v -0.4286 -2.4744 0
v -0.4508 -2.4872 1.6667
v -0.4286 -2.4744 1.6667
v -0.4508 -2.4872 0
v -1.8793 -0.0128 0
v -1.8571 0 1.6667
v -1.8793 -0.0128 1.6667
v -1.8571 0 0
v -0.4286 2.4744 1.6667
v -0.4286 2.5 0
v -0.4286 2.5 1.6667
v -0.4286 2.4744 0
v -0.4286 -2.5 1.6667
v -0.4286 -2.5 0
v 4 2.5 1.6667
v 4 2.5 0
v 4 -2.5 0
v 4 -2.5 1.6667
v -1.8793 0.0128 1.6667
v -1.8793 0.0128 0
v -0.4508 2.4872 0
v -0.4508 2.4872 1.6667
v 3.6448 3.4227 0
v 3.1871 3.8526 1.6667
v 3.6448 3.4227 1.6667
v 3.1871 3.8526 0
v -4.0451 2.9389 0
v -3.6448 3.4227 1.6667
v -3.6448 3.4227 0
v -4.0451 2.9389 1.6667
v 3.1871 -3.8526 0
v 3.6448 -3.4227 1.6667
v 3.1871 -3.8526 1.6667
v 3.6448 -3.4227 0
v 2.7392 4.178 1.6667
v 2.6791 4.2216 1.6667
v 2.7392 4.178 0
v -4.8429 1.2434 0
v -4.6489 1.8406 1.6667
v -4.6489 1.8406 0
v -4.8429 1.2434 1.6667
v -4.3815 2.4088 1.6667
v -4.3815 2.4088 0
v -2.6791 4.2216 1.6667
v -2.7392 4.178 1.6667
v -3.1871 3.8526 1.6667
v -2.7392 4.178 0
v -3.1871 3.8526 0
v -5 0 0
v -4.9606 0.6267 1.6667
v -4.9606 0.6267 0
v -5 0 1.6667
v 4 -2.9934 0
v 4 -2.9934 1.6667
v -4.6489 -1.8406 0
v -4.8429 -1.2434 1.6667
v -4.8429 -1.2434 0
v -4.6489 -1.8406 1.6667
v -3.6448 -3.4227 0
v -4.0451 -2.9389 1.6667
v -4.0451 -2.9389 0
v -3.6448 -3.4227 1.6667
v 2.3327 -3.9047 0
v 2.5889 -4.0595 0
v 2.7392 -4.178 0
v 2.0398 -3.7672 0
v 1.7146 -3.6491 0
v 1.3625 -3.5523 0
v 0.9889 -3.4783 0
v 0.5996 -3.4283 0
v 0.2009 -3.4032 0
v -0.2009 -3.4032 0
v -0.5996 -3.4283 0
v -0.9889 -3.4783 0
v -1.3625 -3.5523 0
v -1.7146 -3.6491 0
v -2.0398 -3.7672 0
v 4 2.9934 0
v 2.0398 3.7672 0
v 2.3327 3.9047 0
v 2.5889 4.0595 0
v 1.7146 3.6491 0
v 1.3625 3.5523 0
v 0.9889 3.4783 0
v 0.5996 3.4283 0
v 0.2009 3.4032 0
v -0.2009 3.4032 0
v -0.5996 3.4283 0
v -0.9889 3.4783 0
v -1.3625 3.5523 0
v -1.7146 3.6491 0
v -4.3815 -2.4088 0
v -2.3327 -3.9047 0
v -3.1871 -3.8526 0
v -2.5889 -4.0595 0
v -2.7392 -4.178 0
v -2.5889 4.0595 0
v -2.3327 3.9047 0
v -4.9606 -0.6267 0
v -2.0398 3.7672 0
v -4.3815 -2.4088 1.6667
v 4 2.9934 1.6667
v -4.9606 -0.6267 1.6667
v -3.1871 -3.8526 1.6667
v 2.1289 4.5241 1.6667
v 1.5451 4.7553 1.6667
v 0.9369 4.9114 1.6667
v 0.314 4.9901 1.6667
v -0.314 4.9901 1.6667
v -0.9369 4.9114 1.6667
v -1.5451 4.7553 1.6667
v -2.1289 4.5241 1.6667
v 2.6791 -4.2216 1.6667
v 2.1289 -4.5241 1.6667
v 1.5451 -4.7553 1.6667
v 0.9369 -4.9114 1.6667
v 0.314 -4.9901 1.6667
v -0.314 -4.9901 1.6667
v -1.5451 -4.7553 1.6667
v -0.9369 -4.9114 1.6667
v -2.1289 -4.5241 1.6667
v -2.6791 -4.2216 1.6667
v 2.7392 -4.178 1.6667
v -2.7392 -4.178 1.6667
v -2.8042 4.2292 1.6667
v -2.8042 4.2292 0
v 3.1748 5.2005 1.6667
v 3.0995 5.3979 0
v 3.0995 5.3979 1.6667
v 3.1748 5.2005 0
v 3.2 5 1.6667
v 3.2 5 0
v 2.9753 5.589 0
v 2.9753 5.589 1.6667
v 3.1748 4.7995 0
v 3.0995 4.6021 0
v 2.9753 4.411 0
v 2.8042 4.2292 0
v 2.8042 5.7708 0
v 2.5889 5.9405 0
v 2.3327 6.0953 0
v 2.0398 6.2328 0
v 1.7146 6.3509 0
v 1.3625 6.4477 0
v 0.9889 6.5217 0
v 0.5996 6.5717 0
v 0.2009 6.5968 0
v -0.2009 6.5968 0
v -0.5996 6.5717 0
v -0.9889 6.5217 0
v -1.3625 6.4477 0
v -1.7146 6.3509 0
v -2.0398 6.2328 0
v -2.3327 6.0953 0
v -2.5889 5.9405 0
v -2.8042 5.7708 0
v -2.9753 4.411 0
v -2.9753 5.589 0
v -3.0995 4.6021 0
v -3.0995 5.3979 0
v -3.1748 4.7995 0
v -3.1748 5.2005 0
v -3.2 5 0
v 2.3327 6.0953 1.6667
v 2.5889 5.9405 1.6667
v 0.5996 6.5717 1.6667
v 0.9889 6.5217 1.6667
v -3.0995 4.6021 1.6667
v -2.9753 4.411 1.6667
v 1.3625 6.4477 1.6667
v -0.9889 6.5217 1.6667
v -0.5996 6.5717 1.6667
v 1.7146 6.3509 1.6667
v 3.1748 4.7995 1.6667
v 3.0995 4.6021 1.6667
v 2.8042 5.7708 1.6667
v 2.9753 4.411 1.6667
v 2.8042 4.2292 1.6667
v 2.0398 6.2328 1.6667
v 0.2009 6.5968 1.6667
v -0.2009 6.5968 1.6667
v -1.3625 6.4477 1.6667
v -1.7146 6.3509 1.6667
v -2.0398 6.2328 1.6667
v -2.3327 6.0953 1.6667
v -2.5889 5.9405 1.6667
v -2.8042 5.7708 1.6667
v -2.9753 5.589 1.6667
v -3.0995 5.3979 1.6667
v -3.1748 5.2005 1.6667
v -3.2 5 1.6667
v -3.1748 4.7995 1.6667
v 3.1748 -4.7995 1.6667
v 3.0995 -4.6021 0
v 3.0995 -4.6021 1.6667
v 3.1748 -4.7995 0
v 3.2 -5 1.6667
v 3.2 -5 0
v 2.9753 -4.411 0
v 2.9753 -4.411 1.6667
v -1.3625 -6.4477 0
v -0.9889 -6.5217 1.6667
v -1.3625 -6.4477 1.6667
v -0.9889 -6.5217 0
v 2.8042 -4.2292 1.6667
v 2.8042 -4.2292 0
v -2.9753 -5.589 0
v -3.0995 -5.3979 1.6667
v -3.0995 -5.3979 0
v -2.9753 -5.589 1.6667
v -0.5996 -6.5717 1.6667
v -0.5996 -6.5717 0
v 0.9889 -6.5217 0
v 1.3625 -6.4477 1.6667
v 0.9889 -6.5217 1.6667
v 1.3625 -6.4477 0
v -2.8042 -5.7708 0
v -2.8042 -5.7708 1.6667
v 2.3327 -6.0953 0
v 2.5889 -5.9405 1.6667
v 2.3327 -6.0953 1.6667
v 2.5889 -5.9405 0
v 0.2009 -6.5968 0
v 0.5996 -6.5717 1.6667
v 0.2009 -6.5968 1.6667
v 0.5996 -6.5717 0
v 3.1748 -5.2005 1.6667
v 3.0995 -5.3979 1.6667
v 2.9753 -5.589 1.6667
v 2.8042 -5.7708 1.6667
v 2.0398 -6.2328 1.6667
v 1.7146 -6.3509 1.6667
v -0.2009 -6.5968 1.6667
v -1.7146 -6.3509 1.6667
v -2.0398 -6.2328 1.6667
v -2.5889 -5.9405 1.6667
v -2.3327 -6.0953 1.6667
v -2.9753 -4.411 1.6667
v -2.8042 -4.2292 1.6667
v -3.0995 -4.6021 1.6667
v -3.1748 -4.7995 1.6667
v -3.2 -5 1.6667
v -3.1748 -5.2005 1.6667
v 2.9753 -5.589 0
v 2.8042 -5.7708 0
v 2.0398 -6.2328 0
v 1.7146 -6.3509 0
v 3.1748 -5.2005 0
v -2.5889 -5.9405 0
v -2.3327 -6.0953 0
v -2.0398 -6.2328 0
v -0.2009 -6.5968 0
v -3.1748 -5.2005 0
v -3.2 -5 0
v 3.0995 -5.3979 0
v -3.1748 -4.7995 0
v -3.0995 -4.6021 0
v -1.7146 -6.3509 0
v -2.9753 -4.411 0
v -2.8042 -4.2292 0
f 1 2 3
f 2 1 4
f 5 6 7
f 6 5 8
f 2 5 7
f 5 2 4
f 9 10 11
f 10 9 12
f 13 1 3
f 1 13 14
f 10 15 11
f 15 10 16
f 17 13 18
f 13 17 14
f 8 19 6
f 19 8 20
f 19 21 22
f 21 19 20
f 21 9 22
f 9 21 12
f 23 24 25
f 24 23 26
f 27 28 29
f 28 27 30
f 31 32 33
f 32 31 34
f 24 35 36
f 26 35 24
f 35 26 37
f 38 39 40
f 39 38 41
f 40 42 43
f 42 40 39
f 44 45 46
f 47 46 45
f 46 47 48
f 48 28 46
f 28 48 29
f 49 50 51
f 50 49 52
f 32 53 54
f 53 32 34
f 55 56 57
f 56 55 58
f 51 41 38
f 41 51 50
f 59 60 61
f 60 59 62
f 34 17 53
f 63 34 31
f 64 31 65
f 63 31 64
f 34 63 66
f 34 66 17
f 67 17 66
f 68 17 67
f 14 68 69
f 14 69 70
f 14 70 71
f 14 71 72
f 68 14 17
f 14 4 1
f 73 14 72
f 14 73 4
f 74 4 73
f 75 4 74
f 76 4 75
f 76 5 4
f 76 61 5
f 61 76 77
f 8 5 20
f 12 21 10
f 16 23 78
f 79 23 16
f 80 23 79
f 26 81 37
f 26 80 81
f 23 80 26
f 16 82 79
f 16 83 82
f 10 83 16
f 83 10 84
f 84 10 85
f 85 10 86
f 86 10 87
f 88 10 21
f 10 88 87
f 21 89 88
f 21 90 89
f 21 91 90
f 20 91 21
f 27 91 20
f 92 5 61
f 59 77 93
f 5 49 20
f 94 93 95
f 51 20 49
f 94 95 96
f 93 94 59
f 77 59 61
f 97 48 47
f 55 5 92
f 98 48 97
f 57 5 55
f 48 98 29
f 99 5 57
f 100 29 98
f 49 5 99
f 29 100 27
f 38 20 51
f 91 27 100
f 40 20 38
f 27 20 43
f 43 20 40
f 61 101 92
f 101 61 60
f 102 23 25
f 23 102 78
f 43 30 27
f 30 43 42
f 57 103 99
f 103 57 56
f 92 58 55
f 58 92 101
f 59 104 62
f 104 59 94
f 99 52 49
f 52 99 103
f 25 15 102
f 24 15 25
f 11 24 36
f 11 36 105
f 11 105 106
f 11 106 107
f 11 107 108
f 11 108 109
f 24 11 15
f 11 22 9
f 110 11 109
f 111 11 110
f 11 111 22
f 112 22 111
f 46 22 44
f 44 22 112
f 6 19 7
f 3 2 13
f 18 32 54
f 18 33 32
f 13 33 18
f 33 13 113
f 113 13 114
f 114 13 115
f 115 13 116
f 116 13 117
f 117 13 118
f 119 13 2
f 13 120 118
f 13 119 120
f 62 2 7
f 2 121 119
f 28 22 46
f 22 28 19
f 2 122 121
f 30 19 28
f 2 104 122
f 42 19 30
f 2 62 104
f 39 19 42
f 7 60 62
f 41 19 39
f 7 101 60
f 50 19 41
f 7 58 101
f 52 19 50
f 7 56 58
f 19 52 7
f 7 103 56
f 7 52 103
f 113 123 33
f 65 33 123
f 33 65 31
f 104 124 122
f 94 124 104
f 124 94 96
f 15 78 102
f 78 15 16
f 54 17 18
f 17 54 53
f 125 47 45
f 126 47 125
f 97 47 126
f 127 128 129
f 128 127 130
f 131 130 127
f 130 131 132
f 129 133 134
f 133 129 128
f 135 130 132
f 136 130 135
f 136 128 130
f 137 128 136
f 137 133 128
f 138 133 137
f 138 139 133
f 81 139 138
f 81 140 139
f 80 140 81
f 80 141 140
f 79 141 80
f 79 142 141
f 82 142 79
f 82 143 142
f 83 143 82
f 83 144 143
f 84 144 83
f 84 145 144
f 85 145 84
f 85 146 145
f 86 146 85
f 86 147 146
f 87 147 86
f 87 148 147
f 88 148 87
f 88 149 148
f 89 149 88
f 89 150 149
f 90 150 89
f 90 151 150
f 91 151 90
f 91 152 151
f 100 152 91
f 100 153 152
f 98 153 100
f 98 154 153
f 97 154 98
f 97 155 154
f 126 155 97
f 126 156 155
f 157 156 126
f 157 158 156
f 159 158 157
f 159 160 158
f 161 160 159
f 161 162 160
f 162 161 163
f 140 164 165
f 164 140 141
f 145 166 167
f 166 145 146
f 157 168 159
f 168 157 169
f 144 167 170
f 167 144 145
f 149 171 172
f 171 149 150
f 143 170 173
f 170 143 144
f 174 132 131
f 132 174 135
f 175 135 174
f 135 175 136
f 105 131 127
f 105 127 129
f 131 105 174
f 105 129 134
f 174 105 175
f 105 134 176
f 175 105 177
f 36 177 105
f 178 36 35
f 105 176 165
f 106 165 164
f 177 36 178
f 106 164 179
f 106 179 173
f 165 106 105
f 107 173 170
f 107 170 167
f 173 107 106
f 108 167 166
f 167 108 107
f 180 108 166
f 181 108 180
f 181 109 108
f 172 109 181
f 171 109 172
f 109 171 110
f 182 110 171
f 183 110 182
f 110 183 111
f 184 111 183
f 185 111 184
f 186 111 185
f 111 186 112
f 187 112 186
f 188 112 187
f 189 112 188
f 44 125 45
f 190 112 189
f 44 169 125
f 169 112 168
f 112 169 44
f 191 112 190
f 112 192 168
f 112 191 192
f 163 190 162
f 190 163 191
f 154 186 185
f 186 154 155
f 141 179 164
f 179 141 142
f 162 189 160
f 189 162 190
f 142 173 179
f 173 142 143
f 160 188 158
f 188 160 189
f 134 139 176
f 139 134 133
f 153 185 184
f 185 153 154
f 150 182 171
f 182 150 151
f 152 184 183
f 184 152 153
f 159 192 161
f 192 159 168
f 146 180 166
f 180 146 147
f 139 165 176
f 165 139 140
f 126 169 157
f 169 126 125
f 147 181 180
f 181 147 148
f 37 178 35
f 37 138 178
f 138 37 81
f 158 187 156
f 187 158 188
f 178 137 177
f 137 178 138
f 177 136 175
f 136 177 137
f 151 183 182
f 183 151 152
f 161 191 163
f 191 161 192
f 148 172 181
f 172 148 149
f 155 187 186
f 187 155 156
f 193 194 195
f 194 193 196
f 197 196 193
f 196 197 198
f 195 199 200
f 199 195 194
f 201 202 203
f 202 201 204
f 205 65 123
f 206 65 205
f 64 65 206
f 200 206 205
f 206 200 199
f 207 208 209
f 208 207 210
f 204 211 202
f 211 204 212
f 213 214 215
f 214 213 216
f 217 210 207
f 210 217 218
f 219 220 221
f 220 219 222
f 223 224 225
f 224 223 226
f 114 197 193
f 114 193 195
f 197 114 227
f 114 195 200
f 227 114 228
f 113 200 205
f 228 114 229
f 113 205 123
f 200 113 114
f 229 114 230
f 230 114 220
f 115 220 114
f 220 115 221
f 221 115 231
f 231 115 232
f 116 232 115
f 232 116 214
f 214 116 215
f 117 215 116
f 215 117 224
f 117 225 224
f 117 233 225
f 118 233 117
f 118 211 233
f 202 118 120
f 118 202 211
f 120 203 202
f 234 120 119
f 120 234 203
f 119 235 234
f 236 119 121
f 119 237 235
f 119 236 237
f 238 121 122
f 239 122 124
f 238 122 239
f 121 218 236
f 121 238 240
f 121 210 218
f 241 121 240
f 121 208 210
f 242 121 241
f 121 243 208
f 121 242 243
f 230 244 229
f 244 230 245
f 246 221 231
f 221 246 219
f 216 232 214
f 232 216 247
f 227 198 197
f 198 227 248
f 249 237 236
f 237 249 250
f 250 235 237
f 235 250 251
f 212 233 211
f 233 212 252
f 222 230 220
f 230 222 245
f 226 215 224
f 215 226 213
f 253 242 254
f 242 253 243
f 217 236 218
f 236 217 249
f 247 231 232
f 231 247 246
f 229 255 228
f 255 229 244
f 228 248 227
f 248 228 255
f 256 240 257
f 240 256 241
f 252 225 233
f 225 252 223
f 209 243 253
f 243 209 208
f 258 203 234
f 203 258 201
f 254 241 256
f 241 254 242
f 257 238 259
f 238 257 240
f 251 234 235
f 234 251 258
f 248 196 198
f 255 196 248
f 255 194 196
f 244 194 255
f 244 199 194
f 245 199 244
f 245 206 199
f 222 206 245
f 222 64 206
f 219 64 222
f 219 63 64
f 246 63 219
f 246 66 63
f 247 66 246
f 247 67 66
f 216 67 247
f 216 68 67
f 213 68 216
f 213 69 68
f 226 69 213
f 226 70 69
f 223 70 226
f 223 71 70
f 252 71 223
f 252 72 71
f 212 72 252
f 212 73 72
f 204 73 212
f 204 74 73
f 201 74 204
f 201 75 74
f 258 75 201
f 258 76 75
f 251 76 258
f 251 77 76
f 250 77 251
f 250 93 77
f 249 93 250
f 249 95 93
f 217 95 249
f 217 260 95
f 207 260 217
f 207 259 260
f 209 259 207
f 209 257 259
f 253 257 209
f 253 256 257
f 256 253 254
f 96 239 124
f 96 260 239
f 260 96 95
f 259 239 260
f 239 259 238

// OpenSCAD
/* 	Nut-Leia By schlem
		theschlem@gmail.com
	 	6-17-13

A glue-on nut trap for use with laser-cut birch
plywood parts or what have you.  I used these
to hold the bed levelling hardware on my  
Printrbot+

I originally modelled it with square tabs to increase
the torque of the glue attachment, which led to 
the predictable development of a "cinnamon-buns" 
Princess Leia Organa silhouette.  

https://en.wikipedia.org/wiki/Princess_Leia

Hexagon, ellipticalCylinder modules poached from:
 *  OpenSCAD Shapes Library (www.openscad.org)
 *  Copyright (C) 2009  Catarina Mota
 *  Copyright (C) 2010  Elmo Mäntynen
 *
 *  License: LGPL 2.1 or later

*/

// ***************  First Things ***************  

$fn=50*1;

// ***************  Parameters ***************    

// Size of Nut in mm
nut = 5;		// across flats, in MILIMETERS
//		Here's a handy link to inch --> mm conversions
//		http://mdmetric.com/tech/cvtcht.htm



//=== constants and relative values ===

height = nut * .33333333;	// scales height:nut
buns_scale = .80*1;				// scales buns:head

// ***************  Top Level code ***************   

union(){
	jaws(nut);
	CinnamonBuns(nut*buns_scale, (nut/2)*buns_scale, height, nut);
}

// ***************  Modules ***************  

//=== jaws === 

module jaws(x = 4, z = 2) {
	translate([0,0,height/2])
	difference(){
		cylinder(h = height, r =x, center = true);
		
		translate([x/5,0,0])
		union(){
		hexagon(x,x);
		translate([x/2,0,0])
			cube(x, center = true);
		}
		translate([nut*1.8,0,0])
		cube (nut*2, center = true);
	}
}

//=== CinnamonBuns === 

module CinnamonBuns(r1 = 3, r2 = 1.5, h = 2, t = 3){
	translate([0,t,0])
	ellipticalCylinder(r1*buns_scale,r2*buns_scale,h);	

	translate([0,-t,0])
	ellipticalCylinder(r1*buns_scale,r2*buns_scale,h);	
}

//=== hexagon === size is the XY plane size, height in Z

module hexagon(size, height) {
  boxWidth = size/1.75;
  for (r = [-60, 0, 60]) rotate([0,0,r]) cube([boxWidth, size, height], true);
} 

//=== ellipticalCylinder === 

module ellipticalCylinder(w,h, height, center = false) {
  scale([1, h/w, 1]) cylinder(h=height, r=w, center=center);
}





